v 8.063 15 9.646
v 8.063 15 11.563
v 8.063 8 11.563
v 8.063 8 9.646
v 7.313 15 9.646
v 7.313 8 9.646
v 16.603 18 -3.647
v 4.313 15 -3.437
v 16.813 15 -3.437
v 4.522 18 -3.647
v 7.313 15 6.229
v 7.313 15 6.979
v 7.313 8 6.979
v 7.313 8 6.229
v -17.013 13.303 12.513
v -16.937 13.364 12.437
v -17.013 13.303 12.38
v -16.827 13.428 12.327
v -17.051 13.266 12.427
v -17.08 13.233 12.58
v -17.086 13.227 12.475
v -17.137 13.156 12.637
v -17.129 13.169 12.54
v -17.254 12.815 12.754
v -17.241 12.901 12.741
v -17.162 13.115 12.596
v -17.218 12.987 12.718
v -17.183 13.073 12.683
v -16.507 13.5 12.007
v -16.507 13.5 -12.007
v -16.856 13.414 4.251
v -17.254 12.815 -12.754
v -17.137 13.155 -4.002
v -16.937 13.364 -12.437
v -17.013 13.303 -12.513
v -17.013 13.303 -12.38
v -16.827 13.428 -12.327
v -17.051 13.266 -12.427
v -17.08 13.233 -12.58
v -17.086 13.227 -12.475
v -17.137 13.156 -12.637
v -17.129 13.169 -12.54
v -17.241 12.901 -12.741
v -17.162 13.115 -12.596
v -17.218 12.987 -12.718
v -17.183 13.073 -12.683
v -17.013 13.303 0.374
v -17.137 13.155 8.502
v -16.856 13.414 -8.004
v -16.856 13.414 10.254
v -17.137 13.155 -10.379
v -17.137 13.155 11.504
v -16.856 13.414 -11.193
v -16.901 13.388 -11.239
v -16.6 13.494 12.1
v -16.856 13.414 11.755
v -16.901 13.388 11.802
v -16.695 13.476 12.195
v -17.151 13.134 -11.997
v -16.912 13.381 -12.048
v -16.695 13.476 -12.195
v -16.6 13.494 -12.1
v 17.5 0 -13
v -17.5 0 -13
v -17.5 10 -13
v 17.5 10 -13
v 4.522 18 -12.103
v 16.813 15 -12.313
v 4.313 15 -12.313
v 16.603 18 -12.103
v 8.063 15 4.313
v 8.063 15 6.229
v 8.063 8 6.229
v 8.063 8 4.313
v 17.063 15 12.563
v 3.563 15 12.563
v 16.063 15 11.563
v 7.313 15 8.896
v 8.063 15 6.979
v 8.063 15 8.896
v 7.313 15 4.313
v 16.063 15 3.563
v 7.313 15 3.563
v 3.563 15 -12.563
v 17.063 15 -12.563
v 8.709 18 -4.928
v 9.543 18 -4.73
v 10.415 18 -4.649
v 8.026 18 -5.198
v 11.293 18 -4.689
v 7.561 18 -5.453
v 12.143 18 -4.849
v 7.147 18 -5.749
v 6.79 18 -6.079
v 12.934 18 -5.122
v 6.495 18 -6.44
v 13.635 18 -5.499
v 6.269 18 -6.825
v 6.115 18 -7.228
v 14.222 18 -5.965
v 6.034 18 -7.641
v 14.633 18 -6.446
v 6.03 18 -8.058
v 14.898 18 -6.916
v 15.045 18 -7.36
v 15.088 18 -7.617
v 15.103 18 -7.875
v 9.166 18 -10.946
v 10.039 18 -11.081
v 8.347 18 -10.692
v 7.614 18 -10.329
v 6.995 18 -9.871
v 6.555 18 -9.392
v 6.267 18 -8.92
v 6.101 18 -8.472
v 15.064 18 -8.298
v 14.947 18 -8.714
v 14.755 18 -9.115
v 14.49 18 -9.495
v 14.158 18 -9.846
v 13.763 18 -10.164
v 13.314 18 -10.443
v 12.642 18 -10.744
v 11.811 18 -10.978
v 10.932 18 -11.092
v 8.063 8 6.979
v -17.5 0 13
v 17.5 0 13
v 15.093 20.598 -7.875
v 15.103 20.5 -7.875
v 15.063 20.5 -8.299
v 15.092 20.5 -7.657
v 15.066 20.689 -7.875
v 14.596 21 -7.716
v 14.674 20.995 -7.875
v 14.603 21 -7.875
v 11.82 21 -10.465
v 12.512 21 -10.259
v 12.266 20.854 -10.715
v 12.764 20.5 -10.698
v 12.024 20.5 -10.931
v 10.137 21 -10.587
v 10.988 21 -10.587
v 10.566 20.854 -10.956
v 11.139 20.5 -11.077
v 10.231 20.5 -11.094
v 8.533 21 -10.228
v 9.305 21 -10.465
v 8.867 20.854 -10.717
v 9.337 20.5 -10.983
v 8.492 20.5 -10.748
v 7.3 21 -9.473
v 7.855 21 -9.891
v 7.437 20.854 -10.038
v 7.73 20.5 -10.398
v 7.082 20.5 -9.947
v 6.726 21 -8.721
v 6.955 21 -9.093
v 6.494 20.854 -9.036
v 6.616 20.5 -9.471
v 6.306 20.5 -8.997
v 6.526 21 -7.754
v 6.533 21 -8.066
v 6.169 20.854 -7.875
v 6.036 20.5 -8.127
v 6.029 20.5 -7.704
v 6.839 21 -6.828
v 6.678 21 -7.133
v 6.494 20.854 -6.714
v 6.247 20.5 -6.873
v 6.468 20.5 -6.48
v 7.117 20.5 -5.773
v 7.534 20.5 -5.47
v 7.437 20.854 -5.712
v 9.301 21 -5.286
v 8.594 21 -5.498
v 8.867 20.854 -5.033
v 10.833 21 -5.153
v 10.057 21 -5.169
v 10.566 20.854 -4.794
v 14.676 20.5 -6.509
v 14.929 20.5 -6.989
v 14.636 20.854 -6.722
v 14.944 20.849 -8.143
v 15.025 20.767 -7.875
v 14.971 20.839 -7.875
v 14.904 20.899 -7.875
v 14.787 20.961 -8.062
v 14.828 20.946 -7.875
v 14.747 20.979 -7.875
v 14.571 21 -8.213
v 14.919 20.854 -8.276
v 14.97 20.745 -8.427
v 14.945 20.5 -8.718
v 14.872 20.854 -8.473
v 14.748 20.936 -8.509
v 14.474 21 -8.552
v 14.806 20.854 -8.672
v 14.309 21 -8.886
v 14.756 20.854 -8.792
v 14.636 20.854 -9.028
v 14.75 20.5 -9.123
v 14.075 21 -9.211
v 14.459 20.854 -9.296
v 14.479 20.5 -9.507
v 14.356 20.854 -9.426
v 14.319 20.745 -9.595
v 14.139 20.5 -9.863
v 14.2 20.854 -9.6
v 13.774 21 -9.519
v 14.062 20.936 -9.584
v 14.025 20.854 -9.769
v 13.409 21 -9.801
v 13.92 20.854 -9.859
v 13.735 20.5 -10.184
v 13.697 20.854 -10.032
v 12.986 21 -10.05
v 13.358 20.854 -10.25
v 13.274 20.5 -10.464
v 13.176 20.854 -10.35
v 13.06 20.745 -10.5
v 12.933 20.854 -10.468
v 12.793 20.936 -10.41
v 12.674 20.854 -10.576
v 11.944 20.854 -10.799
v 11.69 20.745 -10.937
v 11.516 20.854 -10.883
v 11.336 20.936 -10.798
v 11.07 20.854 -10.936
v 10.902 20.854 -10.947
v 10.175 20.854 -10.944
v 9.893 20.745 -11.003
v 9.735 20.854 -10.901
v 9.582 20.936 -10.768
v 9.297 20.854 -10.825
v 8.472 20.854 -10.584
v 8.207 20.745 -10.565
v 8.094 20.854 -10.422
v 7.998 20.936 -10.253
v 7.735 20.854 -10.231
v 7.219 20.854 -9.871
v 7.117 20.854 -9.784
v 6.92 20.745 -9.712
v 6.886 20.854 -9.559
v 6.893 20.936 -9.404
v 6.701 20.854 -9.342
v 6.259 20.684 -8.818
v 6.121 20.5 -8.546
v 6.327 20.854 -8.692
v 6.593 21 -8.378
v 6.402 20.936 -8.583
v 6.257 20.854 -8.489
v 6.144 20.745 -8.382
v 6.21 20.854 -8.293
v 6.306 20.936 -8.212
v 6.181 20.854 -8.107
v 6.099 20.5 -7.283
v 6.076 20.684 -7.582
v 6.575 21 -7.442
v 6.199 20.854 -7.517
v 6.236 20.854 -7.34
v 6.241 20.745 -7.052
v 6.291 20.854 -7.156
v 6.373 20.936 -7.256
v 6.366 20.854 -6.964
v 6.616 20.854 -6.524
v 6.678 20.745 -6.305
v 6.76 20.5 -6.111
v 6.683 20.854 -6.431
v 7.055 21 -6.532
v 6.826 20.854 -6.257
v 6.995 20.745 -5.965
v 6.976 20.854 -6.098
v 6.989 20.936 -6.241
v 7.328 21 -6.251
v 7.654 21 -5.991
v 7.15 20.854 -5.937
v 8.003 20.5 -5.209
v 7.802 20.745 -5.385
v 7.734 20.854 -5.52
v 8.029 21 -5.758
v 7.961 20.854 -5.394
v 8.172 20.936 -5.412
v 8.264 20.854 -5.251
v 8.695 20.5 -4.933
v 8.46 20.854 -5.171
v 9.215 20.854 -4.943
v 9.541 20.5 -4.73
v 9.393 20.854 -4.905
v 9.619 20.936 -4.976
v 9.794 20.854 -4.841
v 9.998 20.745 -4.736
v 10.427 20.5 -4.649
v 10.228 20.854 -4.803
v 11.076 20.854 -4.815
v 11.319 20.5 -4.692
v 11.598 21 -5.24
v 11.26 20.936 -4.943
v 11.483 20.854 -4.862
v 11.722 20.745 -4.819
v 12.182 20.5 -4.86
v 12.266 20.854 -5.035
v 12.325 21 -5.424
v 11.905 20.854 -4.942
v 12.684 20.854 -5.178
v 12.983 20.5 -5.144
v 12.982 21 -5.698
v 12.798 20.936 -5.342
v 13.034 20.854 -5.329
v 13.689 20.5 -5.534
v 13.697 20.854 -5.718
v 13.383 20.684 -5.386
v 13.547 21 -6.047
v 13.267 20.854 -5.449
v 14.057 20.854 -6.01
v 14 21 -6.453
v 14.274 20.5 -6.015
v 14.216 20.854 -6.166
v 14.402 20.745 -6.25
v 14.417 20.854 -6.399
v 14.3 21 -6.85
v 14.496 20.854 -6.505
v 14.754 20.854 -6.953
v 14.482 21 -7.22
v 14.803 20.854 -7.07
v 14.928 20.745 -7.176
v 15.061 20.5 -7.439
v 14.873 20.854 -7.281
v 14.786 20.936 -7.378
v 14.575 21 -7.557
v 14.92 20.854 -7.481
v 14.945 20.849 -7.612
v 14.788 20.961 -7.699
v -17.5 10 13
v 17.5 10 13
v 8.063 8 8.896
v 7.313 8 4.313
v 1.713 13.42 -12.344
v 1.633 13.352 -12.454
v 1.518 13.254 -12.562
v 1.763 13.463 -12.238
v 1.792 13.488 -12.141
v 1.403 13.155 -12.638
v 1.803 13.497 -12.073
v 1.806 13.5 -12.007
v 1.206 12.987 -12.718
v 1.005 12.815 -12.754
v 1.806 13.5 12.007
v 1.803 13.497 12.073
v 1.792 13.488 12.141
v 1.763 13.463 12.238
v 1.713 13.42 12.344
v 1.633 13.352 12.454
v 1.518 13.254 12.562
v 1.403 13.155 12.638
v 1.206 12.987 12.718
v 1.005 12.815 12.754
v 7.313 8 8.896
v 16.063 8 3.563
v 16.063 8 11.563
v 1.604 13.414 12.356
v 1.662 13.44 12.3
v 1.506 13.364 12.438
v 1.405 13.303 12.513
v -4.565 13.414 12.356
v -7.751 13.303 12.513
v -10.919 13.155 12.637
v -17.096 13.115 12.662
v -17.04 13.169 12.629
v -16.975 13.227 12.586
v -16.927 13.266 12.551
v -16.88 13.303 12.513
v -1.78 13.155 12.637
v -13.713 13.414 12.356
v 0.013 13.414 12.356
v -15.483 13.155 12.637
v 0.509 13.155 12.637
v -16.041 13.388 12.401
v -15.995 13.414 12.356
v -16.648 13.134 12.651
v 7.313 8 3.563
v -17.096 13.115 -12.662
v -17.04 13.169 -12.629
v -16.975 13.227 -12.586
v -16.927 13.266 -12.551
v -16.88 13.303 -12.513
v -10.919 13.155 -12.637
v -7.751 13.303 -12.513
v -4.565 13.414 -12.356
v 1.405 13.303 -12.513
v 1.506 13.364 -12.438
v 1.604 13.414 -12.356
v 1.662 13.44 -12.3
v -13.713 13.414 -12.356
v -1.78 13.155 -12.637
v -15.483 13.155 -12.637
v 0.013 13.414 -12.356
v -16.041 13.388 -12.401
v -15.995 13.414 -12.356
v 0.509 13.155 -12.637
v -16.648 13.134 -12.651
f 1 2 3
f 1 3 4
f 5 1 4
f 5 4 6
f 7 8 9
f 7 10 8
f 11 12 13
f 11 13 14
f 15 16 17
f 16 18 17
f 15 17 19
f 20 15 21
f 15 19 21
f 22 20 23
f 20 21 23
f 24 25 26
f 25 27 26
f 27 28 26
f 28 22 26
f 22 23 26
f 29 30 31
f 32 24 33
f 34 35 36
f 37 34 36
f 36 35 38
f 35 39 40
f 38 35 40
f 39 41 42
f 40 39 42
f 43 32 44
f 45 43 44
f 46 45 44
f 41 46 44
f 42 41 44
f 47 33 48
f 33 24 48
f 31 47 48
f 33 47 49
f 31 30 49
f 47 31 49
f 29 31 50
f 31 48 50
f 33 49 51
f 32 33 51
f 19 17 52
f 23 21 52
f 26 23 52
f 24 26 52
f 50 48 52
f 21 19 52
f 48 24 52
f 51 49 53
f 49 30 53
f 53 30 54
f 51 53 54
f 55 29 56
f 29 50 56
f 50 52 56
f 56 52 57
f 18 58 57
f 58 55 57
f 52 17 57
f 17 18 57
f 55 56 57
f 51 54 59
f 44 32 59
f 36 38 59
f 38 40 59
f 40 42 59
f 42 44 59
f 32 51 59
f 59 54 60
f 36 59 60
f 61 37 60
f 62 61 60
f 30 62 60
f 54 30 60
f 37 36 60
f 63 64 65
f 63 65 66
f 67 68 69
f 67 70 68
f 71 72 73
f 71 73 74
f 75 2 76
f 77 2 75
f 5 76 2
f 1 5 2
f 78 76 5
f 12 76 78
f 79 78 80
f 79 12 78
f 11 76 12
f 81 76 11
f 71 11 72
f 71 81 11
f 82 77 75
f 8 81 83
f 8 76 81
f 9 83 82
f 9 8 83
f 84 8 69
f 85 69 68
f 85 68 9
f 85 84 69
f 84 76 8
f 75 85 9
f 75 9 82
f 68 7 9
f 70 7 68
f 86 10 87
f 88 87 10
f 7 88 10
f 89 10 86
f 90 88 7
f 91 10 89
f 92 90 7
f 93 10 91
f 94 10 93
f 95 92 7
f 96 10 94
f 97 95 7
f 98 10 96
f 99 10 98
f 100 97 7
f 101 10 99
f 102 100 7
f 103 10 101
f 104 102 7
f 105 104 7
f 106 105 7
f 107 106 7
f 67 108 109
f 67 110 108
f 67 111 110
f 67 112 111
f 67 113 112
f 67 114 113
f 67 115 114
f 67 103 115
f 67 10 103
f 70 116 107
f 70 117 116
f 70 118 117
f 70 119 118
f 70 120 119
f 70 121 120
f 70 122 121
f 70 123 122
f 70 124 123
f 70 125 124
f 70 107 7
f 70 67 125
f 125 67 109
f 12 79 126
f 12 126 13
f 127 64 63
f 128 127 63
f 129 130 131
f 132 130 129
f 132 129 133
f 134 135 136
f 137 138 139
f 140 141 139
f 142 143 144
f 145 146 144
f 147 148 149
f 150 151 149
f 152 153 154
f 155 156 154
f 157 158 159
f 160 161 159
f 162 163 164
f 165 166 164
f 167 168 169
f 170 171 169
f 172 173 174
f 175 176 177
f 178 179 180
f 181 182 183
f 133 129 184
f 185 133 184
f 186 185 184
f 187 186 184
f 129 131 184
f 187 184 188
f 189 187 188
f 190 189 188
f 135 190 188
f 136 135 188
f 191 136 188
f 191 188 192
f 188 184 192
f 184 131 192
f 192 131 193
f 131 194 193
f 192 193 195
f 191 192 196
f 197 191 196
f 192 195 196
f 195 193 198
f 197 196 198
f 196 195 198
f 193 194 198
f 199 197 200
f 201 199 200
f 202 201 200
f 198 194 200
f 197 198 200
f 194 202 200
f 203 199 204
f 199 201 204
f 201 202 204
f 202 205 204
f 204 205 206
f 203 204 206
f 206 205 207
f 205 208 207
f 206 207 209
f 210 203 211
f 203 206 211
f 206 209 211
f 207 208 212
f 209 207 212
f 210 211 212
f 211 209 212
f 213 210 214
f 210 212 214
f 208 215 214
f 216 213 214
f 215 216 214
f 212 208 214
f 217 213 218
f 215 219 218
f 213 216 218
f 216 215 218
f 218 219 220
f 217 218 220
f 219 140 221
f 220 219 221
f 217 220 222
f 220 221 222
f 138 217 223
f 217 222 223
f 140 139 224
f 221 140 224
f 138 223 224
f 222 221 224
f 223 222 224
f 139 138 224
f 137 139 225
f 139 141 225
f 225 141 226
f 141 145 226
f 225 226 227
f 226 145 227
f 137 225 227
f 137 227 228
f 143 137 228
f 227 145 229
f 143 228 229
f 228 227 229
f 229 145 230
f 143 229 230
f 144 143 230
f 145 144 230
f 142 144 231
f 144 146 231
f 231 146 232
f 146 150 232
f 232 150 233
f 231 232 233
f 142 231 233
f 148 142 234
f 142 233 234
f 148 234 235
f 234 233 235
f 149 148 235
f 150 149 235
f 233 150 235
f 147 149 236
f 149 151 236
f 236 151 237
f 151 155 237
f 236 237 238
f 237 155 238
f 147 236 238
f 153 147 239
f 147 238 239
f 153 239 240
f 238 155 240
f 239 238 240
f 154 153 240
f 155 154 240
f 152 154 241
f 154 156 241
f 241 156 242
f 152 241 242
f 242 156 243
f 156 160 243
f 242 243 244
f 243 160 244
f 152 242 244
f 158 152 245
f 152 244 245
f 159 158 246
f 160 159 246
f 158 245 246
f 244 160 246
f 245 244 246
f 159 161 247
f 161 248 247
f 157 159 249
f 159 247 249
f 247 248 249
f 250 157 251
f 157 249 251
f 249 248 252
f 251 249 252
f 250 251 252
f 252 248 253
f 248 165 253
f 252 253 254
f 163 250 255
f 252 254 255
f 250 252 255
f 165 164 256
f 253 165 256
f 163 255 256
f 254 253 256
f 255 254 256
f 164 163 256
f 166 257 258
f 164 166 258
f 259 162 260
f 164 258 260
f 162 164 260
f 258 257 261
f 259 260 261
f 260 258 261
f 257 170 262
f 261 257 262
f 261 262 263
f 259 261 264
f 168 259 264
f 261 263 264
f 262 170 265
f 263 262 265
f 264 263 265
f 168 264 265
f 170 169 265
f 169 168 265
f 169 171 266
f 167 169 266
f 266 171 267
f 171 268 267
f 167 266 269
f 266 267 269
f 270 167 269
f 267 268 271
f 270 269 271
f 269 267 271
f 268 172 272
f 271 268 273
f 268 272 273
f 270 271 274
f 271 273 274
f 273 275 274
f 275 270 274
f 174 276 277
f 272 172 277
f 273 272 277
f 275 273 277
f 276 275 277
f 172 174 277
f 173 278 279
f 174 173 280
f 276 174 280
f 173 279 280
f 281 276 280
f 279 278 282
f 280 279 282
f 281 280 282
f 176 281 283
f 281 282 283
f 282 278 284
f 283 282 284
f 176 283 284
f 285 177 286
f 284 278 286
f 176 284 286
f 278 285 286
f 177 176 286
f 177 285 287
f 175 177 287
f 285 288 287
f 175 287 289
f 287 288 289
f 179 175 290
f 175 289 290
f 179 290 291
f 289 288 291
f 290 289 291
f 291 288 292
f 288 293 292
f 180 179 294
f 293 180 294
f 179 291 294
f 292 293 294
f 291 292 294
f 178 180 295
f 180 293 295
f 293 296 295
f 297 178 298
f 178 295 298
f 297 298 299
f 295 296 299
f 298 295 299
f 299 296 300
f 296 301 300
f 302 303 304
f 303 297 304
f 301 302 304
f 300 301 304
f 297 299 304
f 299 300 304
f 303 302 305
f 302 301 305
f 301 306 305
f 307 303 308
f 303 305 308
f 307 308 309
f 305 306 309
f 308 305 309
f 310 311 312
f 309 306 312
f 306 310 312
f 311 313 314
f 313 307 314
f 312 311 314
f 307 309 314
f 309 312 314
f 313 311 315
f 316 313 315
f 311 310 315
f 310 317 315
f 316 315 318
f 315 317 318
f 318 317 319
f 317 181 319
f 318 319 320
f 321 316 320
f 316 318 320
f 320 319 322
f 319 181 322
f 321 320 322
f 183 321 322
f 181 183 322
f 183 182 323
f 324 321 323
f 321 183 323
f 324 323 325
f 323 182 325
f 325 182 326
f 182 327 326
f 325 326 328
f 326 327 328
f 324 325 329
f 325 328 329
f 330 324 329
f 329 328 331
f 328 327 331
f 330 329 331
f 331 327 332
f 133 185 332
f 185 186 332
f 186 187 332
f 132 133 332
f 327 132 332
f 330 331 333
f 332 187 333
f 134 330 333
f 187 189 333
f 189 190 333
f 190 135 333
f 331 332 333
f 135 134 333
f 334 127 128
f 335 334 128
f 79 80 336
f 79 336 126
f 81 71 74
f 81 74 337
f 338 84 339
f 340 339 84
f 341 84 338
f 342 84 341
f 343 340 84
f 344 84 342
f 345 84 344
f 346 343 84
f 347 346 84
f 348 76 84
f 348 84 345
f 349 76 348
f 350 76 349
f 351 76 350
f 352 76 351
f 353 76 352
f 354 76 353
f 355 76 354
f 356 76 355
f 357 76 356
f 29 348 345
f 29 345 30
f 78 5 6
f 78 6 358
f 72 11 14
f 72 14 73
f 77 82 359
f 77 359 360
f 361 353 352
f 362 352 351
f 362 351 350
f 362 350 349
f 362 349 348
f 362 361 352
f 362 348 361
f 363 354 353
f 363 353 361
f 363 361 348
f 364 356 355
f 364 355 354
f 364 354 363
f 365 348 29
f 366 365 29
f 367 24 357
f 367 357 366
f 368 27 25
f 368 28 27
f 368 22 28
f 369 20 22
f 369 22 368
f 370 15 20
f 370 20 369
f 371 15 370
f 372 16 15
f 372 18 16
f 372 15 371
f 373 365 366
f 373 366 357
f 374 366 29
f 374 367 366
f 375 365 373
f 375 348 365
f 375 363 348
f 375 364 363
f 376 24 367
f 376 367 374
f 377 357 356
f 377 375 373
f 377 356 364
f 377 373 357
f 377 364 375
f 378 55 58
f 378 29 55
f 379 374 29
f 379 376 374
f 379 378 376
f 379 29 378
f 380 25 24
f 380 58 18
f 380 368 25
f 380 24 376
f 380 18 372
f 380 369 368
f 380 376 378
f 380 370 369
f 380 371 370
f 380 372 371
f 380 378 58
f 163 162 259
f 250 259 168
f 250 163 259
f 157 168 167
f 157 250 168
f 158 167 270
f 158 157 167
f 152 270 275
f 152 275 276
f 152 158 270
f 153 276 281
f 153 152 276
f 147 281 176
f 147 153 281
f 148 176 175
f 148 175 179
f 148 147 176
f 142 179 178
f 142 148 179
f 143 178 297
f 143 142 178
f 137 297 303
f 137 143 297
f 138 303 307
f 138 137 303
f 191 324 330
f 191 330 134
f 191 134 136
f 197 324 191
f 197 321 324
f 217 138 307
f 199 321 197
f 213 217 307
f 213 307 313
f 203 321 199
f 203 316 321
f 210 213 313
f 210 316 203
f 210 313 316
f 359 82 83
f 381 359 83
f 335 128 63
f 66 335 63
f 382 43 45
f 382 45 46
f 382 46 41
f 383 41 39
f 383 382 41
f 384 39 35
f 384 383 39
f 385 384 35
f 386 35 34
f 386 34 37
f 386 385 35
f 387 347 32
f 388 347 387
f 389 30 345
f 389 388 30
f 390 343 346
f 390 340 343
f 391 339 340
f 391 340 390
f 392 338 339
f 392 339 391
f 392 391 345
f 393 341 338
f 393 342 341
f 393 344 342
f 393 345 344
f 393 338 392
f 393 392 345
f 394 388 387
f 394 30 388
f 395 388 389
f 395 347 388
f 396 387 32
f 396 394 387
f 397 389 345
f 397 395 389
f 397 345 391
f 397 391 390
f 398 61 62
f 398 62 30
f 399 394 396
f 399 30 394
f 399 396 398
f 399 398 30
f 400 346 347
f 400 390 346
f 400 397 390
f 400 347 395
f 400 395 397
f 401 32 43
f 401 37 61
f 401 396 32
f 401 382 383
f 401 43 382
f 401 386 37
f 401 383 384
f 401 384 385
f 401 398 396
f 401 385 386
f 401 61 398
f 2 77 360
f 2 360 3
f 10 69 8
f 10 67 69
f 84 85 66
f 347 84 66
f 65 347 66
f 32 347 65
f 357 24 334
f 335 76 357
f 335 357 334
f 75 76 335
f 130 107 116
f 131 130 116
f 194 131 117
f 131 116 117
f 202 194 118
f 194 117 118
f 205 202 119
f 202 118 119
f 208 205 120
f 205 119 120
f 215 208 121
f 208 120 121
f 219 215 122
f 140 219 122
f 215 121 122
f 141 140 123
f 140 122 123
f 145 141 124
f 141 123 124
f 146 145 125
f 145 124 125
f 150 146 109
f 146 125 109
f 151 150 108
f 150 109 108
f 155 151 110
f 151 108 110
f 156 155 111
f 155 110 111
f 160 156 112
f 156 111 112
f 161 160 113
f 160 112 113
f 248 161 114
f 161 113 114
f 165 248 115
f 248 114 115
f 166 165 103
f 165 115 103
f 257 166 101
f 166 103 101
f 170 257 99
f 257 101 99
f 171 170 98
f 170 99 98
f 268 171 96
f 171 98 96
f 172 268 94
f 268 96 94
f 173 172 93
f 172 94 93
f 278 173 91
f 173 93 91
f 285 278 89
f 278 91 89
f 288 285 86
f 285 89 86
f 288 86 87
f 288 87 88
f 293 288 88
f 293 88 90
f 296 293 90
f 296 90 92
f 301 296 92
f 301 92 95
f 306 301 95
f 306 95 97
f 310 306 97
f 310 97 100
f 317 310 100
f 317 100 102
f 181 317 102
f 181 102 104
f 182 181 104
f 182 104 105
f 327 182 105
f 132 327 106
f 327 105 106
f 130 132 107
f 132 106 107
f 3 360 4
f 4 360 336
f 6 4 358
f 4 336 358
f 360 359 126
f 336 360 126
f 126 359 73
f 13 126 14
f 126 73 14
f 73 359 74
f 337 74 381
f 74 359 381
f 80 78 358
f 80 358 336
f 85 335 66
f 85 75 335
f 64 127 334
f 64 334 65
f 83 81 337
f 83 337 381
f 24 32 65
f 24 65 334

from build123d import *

# Parameters (mm, degrees)
SKETCH1_W           = 35
SKETCH1_H           = 26
BOSS_EXTRUDE1_DEPTH = 10
SKETCH2_W           = 35
SKETCH2_H           = 26
BOSS_EXTRUDE3_DEPTH = 5
BOSS_EXTRUDE3_TAPER = 5
CUT_EXTRUDE1_DEPTH  = 35.745503475
CUT_EXTRUDE2_DEPTH  = 7
SKETCH5_W           = 12.5
SKETCH5_H           = 8.875113364
BOSS_EXTRUDE4_DEPTH = 3
BOSS_EXTRUDE4_TAPER = 4
SKETCH6_RX          = 4.540219564
SKETCH6_RY          = 3.227776247
BOSS_EXTRUDE5_DEPTH = 3
FILLET1_R           = 0.5
FILLET2_R           = 0.75


with BuildPart() as part:
    # Sketch1 → Boss-Extrude1 (new body)
    with BuildSketch(Plane(origin=(0, 0, 0), x_dir=(1, 0, 0), z_dir=(0, 1, 0))):
        Rectangle(SKETCH1_W, SKETCH1_H)
    extrude(amount=BOSS_EXTRUDE1_DEPTH)

    # Sketch2 → Boss-Extrude3 (add)
    with BuildSketch(Plane(origin=(0, 10, 0), x_dir=(1, 0, 0), z_dir=(0, 1, 0))):
        Rectangle(SKETCH2_W, SKETCH2_H)
    extrude(amount=BOSS_EXTRUDE3_DEPTH, taper=BOSS_EXTRUDE3_TAPER)

    # Sketch3 → Cut-Extrude1 (cut, through all)
    with BuildSketch(Plane.XY.offset(13)):
        Polygon((-17.500926093, 15), (3.562556682, 15), (1.806210322, 13.5), (-17.500926093, 13.5), align=None)
    extrude(amount=-CUT_EXTRUDE1_DEPTH, mode=Mode.SUBTRACT)

    # Sketch4 → Cut-Extrude2 (cut)
    with BuildSketch(Plane(origin=(0, 15, 0), x_dir=(1, 0, 0), z_dir=(0, 1, 0))):
        Polygon((8.062556682, -6.229226682), (8.062556682, -4.312556682), (7.312556682, -4.312556682), (7.312556682, -3.562556682), (8.062556682, -3.562556682), (16.062556682, -3.562556682), (16.062556682, -11.562556682), (8.062556682, -11.562556682), (8.062556682, -9.645896682), (7.312556682, -9.645896682), (7.312556682, -8.895896682), (8.062556682, -8.895896682), (8.062556682, -6.979226682), (7.312556682, -6.979226682), (7.312556682, -6.229226682), align=None)
    extrude(amount=-CUT_EXTRUDE2_DEPTH, mode=Mode.SUBTRACT)

    # Sketch5 → Boss-Extrude4 (add)
    with BuildSketch(Plane(origin=(0, 15, 0), x_dir=(1, 0, 0), z_dir=(0, 1, 0))):
        with Locations((10.562556682, 7.875)):
            Rectangle(SKETCH5_W, SKETCH5_H)
    extrude(amount=BOSS_EXTRUDE4_DEPTH, taper=BOSS_EXTRUDE4_TAPER)

    # Sketch6 → Boss-Extrude5 (add)
    with BuildSketch(Plane(origin=(0, 18, 0), x_dir=(1, 0, 0), z_dir=(0, 1, 0))):
        with Locations((10.562556682, 7.875)):
            Ellipse(SKETCH6_RX, SKETCH6_RY)
    extrude(amount=BOSS_EXTRUDE5_DEPTH)

    # Fillet1
    fillet1_edges = [part.edges().sort_by_distance(p)[0] for p in [
        (6.022337953, 21, -7.873042931),
    ]]
    fillet(fillet1_edges, radius=FILLET1_R)

    # Fillet2
    fillet2_edges = [part.edges().sort_by_distance(p)[0] for p in [
        (-7.693789678, 13.5, 12.693789678),
        (-7.693789678, 13.5, -12.693789678),
        (-17.193789678, 13.5, 0),
    ]]
    fillet(fillet2_edges, radius=FILLET2_R)


solid = part.part
